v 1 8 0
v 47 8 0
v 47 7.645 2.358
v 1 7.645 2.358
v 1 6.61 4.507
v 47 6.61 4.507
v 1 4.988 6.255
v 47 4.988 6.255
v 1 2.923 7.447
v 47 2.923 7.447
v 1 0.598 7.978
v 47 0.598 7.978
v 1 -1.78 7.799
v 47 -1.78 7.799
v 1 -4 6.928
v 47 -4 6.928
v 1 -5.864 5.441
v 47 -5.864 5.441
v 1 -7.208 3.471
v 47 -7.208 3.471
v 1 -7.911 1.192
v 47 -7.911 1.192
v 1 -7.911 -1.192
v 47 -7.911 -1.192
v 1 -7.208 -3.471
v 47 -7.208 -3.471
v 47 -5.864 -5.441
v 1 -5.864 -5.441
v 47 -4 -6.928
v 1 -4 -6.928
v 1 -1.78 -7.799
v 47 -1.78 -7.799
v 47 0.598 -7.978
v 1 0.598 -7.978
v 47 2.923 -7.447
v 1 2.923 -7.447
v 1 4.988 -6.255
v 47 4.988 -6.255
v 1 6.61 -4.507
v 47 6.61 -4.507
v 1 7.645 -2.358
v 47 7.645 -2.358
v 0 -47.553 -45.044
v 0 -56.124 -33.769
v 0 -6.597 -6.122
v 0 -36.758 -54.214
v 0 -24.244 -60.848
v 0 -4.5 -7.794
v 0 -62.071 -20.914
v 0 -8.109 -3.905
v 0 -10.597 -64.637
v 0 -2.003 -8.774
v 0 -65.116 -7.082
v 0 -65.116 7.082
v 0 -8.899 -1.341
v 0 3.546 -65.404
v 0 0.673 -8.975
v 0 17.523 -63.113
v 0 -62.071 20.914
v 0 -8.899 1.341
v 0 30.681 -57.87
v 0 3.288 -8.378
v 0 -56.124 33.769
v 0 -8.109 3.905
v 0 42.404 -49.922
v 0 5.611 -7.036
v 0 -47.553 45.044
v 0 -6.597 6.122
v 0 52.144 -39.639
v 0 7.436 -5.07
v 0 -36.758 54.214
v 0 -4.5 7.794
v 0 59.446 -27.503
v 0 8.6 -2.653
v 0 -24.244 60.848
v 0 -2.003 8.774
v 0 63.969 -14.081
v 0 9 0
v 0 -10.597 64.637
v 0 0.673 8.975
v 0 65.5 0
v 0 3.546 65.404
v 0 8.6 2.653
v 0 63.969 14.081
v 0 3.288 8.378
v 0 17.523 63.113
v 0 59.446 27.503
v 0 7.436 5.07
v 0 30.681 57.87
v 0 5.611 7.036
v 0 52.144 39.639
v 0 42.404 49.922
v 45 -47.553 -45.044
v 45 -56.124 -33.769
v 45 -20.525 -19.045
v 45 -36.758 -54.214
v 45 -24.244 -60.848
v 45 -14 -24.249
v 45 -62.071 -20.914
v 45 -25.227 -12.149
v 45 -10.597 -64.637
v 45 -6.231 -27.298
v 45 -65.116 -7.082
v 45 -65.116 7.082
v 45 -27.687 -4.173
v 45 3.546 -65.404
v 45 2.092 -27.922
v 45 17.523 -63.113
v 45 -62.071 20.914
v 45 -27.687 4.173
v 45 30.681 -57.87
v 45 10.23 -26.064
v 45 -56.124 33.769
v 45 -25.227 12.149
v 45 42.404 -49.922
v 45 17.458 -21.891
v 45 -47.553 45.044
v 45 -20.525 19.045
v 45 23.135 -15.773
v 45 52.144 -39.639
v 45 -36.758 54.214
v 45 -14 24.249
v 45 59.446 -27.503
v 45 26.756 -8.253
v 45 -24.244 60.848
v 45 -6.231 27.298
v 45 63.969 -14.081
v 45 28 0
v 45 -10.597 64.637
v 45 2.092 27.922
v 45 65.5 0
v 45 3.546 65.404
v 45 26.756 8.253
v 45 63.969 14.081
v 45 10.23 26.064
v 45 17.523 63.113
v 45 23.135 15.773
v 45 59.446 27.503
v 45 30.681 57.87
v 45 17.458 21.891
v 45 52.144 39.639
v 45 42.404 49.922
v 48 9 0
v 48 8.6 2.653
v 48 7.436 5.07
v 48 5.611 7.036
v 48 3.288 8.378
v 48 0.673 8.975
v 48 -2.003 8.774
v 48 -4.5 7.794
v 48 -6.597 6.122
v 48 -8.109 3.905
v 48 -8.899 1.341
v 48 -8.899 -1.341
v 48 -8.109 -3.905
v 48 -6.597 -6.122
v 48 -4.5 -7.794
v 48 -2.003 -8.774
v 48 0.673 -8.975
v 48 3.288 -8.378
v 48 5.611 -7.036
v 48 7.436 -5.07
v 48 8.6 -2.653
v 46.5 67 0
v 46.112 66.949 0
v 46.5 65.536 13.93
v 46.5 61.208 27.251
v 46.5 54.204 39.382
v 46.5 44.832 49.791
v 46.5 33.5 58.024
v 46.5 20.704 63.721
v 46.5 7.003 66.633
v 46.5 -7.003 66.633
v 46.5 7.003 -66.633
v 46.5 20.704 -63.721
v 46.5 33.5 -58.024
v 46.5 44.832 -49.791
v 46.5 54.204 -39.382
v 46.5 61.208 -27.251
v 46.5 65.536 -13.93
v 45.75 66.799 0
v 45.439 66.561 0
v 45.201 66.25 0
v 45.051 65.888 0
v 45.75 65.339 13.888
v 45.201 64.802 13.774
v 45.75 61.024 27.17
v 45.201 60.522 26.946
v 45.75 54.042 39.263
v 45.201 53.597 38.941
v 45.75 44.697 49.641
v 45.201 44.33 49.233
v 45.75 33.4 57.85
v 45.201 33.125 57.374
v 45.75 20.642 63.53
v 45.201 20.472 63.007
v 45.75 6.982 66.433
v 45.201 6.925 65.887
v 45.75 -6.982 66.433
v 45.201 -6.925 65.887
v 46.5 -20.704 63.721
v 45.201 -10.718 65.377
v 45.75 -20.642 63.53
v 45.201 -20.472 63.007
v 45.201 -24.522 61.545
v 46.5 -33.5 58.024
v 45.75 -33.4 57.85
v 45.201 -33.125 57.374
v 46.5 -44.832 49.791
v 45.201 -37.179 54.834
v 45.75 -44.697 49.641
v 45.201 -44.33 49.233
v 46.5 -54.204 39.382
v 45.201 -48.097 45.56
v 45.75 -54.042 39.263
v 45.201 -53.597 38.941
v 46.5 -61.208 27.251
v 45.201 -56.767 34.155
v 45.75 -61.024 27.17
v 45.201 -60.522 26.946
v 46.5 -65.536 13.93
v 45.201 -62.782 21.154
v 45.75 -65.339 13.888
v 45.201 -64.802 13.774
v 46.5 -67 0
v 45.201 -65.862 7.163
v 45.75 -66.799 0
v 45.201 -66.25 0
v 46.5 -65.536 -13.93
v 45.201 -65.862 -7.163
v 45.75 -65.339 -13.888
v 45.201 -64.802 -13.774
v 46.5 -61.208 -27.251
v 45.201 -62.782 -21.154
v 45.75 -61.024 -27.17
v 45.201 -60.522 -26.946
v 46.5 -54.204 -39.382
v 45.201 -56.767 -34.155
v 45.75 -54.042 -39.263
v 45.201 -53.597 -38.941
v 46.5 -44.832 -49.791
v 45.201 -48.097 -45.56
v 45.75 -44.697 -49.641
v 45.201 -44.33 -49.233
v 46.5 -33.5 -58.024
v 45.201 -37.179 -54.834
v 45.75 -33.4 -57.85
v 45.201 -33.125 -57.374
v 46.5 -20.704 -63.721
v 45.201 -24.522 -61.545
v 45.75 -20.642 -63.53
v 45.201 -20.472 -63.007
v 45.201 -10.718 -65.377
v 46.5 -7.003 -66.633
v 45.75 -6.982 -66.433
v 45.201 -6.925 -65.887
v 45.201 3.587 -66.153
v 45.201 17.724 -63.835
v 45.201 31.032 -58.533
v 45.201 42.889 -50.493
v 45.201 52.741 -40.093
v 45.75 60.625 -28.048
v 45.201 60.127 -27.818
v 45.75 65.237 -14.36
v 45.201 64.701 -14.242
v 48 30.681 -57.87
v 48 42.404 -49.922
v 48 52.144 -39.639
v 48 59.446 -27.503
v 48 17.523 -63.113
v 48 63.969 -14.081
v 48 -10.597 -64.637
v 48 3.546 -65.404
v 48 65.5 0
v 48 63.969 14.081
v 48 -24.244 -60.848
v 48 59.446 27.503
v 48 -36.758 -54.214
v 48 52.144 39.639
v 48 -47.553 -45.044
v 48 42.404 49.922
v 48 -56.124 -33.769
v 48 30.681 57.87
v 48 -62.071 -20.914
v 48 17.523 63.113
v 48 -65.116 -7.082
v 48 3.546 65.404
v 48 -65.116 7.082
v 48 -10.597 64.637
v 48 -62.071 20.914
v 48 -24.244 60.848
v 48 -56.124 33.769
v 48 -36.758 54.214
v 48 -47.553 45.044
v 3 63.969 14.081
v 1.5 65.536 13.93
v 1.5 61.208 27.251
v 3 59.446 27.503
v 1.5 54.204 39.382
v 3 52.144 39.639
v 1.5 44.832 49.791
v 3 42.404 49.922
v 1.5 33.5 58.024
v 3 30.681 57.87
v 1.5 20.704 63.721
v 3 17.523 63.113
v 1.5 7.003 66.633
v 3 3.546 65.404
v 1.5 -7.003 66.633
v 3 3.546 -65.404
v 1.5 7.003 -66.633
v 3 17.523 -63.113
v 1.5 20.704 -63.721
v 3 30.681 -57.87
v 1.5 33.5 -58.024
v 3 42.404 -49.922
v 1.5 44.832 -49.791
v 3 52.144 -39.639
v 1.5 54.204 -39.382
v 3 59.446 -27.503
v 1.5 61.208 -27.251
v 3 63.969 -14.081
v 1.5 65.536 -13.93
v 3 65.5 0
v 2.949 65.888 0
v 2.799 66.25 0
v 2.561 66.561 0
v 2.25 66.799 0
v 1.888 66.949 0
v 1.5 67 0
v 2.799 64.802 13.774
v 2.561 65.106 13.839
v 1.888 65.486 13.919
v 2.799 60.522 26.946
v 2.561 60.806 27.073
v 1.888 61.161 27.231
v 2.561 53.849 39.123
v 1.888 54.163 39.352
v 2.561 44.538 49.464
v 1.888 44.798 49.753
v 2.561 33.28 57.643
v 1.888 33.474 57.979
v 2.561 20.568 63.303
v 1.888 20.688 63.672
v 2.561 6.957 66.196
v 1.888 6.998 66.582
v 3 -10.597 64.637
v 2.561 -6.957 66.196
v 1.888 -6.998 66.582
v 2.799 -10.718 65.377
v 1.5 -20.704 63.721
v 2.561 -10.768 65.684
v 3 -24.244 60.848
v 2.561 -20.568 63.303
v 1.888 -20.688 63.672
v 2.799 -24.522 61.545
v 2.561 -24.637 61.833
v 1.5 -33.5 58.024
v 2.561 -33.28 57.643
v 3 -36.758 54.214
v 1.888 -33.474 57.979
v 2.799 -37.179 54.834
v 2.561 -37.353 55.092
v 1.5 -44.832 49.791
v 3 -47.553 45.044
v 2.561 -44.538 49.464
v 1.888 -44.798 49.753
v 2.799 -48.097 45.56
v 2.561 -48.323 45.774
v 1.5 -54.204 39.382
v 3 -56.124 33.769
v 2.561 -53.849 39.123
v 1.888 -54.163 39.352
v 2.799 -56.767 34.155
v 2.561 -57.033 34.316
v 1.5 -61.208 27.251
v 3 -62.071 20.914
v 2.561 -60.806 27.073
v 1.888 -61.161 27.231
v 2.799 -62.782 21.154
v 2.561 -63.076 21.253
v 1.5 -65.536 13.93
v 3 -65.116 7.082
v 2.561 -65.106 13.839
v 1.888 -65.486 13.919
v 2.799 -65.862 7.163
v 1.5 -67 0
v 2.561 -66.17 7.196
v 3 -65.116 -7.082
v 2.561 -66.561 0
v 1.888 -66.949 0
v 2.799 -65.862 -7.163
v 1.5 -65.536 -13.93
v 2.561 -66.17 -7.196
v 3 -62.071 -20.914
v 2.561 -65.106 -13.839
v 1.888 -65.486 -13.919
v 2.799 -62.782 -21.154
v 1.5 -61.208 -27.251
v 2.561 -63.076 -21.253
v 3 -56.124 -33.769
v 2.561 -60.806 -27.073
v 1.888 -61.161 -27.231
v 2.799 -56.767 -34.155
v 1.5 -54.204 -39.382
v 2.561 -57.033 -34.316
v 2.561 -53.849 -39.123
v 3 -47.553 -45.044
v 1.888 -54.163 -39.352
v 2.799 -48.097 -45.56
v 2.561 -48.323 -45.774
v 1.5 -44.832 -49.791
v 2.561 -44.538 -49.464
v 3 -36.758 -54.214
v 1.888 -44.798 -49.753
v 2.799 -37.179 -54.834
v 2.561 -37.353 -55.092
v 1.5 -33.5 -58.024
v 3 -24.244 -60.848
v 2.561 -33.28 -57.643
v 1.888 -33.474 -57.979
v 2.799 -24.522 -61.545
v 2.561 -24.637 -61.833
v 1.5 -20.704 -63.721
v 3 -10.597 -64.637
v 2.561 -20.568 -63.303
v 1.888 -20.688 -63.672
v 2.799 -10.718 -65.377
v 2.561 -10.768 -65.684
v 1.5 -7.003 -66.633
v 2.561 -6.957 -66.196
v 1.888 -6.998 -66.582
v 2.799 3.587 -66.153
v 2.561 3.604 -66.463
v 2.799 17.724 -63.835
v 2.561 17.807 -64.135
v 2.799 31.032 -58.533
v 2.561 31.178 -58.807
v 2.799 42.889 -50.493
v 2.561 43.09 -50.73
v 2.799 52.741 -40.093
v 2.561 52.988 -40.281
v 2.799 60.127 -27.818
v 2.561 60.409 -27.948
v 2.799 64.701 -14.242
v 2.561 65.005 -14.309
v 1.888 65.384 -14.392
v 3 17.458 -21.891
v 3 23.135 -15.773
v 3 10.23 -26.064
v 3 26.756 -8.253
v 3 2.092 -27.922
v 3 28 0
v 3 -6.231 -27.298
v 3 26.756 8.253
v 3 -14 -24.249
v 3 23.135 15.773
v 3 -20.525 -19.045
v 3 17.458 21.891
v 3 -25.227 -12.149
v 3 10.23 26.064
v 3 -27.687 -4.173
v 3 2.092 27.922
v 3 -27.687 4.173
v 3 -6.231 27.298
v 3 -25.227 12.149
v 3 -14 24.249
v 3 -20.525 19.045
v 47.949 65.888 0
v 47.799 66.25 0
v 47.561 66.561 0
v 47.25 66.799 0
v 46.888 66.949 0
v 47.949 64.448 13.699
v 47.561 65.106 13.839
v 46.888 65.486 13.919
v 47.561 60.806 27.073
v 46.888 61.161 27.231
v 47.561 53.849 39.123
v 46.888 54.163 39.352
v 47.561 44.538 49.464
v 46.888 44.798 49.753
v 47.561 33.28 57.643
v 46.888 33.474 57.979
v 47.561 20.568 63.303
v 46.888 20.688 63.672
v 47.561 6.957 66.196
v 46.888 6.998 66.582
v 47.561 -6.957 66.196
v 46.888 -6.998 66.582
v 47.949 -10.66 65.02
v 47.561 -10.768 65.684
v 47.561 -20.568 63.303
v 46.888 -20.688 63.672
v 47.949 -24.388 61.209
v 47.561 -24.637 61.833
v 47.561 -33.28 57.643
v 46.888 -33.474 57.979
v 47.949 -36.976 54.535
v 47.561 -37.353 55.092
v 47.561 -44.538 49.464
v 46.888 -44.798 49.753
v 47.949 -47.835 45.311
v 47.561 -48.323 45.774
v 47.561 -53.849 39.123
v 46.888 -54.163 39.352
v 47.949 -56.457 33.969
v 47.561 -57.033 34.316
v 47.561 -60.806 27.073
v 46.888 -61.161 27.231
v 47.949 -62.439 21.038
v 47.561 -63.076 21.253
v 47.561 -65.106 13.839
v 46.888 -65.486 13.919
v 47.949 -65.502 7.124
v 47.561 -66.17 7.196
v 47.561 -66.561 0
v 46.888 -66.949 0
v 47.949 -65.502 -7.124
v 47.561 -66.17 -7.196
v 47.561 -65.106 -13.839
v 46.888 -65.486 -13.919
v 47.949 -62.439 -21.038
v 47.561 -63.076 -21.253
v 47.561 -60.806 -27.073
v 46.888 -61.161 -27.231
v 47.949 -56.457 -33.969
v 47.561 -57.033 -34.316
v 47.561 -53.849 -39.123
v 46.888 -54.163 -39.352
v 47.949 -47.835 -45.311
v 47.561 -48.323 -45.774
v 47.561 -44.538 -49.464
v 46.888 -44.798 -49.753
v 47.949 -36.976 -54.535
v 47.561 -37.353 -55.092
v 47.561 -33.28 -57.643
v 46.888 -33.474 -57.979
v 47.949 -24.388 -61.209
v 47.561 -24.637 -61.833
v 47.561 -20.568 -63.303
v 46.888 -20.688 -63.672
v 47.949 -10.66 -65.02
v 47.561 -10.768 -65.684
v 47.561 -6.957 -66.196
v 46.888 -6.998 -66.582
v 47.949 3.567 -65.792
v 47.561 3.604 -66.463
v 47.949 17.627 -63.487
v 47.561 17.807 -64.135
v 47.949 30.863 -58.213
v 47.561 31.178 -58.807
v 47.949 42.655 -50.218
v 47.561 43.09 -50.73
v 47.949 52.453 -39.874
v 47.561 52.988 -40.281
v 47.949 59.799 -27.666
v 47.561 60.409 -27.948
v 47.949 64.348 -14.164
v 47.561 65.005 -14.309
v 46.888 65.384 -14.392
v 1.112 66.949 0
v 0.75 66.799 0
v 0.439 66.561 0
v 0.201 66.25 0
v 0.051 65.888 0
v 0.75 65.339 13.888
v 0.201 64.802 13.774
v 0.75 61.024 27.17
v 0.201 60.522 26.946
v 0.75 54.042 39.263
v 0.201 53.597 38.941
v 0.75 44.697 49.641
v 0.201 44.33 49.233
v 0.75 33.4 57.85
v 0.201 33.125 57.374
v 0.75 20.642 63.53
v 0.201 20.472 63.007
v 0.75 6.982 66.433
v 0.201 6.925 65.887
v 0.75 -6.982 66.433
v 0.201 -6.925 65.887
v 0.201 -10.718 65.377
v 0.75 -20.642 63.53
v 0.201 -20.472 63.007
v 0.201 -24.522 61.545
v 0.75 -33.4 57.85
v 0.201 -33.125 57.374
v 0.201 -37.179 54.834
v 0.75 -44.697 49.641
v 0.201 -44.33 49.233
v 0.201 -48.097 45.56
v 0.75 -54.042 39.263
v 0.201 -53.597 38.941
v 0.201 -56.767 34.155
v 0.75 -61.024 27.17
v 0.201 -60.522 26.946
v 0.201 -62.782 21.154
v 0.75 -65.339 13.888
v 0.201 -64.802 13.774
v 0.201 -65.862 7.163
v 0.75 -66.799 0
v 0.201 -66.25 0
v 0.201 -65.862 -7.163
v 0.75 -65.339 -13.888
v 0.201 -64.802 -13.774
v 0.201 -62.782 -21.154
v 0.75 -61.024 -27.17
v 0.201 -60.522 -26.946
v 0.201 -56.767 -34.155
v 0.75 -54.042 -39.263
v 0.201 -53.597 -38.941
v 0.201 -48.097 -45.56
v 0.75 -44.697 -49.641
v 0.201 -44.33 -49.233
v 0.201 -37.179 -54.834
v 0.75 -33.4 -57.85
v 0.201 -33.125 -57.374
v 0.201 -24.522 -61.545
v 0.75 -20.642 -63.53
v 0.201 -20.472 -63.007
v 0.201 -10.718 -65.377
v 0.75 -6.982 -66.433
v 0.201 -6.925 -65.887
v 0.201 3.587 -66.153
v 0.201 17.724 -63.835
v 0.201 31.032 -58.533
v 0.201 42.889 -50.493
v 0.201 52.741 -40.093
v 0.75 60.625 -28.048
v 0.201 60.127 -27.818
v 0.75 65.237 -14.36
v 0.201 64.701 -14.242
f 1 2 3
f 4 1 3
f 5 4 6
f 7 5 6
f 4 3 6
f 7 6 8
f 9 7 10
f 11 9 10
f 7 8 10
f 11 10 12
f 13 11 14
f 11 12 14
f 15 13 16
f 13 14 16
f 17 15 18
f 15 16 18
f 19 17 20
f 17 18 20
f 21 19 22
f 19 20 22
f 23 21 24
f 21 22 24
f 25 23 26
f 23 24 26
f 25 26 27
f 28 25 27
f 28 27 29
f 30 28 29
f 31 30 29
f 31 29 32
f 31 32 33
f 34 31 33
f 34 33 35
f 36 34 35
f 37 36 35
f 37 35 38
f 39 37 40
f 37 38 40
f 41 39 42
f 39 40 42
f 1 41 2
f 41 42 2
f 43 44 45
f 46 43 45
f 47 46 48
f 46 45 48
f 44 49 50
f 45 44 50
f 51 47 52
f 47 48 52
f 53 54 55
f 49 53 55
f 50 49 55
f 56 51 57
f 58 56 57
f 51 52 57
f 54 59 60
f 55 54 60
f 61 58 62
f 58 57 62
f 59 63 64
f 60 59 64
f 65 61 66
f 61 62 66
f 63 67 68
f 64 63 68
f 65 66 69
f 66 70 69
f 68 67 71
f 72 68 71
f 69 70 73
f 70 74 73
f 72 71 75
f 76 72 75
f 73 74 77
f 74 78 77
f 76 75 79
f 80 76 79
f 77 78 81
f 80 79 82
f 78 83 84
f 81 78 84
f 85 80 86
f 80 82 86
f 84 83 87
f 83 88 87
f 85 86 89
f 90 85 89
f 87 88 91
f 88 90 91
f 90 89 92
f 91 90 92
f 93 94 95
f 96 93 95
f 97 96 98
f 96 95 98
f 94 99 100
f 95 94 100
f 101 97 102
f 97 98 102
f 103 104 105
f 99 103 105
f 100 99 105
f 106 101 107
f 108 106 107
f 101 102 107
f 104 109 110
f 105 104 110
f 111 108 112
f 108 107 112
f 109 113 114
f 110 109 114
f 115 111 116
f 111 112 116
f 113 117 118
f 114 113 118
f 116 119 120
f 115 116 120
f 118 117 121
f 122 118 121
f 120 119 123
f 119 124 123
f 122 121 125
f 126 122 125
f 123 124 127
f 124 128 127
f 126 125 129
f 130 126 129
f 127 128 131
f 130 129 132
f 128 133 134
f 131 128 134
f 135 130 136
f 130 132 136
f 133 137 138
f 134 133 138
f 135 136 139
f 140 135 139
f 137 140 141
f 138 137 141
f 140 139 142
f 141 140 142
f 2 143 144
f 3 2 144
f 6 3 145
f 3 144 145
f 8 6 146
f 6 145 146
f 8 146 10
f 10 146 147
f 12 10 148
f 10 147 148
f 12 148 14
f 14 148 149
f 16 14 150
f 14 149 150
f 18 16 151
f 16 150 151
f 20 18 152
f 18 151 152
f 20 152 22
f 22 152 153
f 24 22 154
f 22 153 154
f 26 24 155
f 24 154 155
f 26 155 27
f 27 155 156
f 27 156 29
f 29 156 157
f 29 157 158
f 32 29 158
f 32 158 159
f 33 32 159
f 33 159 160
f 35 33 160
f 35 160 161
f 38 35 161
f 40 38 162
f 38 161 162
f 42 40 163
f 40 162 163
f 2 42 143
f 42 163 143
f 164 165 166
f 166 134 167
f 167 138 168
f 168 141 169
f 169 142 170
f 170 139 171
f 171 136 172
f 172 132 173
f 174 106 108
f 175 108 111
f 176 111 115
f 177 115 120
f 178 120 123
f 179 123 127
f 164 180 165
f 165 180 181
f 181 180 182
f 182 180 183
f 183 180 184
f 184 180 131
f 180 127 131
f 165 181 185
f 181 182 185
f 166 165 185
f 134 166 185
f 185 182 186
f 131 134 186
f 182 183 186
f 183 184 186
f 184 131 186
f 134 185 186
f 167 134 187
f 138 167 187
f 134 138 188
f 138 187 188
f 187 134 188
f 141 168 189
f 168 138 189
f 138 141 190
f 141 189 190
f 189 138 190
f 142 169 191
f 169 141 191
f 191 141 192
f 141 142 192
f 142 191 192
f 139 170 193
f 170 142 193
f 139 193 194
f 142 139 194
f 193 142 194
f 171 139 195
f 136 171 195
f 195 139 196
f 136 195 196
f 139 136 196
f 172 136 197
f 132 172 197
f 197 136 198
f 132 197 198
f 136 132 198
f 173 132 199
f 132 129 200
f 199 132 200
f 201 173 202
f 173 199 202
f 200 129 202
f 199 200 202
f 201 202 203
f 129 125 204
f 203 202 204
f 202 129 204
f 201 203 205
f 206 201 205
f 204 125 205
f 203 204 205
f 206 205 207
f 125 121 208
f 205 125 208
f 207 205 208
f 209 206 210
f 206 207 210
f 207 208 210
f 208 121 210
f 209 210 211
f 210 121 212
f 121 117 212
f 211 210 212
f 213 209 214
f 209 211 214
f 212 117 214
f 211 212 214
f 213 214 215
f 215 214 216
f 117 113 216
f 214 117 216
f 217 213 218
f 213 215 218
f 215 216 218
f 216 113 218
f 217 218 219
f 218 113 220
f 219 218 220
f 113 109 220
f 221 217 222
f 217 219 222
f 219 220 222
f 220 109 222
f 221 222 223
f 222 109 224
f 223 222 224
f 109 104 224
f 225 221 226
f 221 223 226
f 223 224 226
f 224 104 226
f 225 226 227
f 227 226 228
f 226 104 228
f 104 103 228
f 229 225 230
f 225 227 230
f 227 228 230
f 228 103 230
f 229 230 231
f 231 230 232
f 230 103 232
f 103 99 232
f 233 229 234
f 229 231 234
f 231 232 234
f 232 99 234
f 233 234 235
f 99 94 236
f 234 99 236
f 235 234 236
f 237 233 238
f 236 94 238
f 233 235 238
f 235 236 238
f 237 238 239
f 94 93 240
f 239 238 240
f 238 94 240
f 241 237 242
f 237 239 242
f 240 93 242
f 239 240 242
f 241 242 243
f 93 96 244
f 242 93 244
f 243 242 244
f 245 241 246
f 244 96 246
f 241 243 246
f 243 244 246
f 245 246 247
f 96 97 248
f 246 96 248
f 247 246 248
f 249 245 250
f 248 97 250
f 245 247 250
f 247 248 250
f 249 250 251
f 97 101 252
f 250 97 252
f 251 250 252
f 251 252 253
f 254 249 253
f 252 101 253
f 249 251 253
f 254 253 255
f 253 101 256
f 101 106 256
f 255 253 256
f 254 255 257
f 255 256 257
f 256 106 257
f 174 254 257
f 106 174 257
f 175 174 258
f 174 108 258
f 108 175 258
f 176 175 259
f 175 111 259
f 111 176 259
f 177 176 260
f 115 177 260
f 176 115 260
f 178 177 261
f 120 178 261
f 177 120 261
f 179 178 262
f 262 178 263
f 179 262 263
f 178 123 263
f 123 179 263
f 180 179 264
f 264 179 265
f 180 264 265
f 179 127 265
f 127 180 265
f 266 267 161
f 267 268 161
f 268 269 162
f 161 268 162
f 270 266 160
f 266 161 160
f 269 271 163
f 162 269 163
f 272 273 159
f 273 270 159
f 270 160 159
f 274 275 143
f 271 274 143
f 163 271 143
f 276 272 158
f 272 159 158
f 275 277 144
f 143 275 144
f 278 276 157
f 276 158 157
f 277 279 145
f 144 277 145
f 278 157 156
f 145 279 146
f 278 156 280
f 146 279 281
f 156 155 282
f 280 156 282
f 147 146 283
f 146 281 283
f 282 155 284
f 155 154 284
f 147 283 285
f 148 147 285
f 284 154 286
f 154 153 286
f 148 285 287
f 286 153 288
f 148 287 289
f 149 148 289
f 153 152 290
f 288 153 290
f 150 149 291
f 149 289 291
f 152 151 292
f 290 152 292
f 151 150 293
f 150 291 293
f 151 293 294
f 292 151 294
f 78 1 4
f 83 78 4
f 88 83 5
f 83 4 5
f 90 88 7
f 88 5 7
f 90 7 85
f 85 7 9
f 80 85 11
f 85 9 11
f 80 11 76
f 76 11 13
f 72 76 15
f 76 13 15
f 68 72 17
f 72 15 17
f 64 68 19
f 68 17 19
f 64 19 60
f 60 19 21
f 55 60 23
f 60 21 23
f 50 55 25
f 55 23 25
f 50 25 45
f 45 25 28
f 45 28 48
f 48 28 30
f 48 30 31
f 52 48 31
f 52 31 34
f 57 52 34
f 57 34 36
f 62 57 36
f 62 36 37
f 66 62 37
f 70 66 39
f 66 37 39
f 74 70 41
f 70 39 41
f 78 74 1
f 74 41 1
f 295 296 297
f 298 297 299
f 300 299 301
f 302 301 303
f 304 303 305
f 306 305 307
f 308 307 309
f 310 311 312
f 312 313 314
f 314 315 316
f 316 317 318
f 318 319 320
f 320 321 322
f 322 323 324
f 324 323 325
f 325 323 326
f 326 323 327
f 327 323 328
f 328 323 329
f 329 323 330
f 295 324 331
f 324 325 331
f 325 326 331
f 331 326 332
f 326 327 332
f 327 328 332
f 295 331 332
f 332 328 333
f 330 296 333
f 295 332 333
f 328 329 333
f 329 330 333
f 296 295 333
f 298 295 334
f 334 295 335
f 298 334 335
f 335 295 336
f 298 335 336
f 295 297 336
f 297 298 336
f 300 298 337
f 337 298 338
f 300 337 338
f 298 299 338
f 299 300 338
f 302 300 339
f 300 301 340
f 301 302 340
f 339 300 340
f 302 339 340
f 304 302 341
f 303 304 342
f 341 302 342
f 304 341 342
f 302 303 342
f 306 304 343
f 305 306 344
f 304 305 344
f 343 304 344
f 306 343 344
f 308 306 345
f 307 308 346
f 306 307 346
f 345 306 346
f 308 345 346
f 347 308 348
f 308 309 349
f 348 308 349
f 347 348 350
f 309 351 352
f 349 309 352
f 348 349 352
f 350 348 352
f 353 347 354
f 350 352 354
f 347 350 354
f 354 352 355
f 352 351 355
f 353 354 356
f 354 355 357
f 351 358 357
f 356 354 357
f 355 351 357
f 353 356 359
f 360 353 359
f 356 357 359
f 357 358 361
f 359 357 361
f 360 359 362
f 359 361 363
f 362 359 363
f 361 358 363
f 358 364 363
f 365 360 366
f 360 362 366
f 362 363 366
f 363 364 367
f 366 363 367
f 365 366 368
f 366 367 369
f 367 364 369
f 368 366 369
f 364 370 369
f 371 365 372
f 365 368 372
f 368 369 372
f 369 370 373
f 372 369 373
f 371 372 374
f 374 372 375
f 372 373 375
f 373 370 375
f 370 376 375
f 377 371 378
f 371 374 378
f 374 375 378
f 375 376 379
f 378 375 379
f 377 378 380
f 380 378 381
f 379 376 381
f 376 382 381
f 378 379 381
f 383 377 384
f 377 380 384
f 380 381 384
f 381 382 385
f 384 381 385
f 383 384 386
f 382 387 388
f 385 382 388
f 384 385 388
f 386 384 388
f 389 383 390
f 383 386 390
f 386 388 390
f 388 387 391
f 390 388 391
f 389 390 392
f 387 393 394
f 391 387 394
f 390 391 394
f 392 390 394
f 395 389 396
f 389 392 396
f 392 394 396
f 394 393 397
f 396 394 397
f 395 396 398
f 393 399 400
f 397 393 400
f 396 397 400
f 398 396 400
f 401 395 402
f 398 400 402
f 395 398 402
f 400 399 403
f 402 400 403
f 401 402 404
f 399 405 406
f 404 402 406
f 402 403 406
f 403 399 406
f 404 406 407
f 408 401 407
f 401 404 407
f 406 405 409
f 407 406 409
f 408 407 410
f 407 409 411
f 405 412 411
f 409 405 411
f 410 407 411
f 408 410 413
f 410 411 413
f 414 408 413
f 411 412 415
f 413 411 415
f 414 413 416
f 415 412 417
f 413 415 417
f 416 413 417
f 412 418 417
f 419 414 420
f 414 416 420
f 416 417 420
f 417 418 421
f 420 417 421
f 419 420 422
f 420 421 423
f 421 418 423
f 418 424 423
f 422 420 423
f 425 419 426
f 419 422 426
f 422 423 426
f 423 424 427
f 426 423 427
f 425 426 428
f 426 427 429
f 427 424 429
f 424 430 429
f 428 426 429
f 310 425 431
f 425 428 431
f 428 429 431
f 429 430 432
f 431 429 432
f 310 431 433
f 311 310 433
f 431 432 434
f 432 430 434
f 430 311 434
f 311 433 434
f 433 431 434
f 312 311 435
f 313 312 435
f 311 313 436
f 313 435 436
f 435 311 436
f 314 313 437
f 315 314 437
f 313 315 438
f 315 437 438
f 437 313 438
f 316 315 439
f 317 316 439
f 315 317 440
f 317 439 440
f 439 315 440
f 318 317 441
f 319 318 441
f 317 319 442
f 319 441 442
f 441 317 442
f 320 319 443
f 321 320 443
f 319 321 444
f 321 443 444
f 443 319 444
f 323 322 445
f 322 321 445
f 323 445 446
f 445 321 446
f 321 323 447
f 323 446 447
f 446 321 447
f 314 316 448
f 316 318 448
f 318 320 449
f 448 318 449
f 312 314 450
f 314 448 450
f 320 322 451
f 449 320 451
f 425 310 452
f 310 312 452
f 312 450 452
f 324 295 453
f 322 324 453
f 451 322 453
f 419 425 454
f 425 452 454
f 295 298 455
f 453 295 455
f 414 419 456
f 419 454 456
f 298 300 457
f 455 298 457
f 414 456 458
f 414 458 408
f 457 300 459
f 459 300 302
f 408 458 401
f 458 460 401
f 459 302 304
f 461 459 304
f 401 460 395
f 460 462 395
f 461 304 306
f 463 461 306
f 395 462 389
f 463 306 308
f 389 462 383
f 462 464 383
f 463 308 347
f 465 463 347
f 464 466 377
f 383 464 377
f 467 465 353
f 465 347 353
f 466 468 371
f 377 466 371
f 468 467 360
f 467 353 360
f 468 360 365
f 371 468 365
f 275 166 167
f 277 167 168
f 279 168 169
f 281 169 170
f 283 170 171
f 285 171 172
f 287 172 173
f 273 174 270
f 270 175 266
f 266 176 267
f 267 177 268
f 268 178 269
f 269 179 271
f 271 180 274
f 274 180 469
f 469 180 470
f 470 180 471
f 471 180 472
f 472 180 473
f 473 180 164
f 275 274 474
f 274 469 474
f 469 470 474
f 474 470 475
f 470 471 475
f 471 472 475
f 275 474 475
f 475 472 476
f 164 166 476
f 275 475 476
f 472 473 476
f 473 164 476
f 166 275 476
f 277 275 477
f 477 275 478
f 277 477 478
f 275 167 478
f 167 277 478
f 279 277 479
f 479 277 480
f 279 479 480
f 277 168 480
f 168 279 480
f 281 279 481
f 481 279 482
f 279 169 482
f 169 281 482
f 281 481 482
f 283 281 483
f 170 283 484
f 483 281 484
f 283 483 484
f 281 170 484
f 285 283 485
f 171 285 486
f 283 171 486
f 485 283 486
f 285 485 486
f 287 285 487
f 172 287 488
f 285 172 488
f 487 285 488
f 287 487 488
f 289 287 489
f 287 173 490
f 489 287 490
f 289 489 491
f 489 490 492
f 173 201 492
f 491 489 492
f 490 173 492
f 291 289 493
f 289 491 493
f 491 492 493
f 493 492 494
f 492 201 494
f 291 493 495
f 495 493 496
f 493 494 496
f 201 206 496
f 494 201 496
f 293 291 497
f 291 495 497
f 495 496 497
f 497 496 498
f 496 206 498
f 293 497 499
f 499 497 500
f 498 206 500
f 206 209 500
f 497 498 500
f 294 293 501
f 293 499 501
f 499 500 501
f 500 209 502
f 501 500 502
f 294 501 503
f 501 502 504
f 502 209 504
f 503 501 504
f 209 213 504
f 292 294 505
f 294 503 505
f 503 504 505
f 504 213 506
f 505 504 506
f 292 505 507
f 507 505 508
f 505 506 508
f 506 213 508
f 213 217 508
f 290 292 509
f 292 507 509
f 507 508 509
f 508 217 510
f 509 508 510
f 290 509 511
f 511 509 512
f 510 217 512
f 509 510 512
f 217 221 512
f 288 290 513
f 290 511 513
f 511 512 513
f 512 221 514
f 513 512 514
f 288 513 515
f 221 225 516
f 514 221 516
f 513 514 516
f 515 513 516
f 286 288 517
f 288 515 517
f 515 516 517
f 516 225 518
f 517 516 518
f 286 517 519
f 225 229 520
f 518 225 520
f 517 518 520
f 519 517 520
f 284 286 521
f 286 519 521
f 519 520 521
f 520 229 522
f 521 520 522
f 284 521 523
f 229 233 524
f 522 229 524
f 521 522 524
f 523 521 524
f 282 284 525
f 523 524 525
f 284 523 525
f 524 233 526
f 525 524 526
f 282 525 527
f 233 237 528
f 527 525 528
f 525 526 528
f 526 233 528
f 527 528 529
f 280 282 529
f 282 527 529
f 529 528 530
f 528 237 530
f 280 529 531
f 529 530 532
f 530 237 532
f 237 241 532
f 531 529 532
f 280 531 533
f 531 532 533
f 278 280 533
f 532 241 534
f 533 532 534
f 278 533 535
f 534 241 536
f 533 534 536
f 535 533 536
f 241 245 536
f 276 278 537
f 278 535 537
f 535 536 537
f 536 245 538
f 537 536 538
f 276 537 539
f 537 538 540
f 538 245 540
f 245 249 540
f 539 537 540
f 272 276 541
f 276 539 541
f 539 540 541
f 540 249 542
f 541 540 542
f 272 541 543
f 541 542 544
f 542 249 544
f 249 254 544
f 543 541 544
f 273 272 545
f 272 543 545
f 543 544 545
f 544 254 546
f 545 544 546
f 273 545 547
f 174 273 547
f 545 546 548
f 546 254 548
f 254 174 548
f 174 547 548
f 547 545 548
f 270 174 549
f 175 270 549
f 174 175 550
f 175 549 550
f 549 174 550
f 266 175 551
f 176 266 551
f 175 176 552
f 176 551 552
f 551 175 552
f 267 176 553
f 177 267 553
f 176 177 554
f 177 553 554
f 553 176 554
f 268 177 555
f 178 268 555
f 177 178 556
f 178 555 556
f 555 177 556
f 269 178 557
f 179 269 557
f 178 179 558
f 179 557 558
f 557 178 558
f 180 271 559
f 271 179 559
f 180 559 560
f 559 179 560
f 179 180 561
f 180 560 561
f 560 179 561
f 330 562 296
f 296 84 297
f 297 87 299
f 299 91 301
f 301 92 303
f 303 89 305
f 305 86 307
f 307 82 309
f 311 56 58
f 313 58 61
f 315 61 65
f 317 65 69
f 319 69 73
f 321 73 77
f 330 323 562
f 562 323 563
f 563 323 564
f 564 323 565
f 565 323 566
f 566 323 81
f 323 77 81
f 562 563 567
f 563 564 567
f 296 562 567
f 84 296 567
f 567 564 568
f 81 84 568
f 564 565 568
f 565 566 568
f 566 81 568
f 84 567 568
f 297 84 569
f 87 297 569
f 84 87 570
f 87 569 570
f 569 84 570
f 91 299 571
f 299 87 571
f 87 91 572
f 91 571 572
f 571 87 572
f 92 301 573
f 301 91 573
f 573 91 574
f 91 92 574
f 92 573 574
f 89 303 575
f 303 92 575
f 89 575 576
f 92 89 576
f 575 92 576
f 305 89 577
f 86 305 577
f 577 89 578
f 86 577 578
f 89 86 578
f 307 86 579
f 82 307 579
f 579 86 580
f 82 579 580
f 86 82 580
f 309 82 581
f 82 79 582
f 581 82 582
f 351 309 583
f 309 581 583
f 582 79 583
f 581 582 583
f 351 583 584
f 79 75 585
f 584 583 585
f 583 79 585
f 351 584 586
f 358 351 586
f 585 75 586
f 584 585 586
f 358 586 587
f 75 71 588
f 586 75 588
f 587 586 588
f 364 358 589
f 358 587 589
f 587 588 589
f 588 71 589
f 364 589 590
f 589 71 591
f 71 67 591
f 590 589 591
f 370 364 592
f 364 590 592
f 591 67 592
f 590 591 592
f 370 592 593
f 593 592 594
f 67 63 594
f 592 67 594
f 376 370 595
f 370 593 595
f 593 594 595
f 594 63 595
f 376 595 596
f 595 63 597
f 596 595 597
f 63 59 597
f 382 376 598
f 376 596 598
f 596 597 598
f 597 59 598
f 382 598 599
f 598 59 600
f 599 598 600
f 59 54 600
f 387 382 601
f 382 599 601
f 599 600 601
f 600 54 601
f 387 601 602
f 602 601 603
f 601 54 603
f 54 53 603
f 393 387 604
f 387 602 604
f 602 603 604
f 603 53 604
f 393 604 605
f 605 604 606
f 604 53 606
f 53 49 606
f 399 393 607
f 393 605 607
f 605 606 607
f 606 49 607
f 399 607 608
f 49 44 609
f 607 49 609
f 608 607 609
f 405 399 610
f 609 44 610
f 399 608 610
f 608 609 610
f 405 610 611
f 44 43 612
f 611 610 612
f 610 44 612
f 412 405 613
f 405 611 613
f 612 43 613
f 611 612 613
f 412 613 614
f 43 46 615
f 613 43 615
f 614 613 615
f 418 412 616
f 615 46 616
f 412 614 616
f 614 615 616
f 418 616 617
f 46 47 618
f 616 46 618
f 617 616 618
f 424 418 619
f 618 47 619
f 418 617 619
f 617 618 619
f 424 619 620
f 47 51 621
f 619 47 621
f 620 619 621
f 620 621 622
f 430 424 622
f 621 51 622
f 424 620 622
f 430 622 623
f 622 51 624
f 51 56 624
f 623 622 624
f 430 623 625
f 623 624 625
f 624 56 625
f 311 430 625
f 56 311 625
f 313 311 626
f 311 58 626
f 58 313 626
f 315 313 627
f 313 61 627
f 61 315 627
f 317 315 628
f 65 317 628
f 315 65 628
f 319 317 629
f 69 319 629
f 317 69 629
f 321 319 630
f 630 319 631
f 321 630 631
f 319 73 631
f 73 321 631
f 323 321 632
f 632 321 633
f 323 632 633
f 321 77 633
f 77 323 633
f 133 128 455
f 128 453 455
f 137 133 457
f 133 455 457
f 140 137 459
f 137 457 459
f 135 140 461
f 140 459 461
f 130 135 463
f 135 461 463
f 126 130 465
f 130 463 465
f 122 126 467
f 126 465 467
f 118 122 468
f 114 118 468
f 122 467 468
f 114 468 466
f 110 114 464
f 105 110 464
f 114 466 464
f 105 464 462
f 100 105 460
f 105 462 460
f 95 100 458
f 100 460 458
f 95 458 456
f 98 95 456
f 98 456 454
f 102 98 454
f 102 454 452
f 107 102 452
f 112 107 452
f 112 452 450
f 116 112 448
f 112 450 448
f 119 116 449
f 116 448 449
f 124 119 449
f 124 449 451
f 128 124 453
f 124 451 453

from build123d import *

# Parameters (mm, degrees)
F2_SIZE = 1


with BuildPart() as f1:
    # F0 (on Top) → F1 (revolve)
    with BuildSketch(Plane.XY):
        with BuildLine():
            Line((0, 65.5), (0, 8))
            Line((0, 8), (48, 8))
            Line((48, 8), (48, 65.5))
            ThreePointArc((48, 65.5), (47.56066, 66.56066), (46.5, 67))
            ThreePointArc((46.5, 67), (45.43934, 66.56066), (45, 65.5))
            Line((45, 65.5), (45, 28))
            Line((45, 28), (3, 28))
            Line((3, 28), (3, 65.5))
            ThreePointArc((3, 65.5), (2.56066, 66.56066), (1.5, 67))
            ThreePointArc((1.5, 67), (0.43934, 66.56066), (0, 65.5))
        make_face()
    revolve(axis=Axis((24, 0, 0), (1, 0, 0)))

    # F2
    f2_edges = [f1.edges().sort_by_distance(p)[0] for p in [
        (0, -8, 0),
        (48, -8, 0),
    ]]
    chamfer(f2_edges, length=F2_SIZE)


solid = f1.part
